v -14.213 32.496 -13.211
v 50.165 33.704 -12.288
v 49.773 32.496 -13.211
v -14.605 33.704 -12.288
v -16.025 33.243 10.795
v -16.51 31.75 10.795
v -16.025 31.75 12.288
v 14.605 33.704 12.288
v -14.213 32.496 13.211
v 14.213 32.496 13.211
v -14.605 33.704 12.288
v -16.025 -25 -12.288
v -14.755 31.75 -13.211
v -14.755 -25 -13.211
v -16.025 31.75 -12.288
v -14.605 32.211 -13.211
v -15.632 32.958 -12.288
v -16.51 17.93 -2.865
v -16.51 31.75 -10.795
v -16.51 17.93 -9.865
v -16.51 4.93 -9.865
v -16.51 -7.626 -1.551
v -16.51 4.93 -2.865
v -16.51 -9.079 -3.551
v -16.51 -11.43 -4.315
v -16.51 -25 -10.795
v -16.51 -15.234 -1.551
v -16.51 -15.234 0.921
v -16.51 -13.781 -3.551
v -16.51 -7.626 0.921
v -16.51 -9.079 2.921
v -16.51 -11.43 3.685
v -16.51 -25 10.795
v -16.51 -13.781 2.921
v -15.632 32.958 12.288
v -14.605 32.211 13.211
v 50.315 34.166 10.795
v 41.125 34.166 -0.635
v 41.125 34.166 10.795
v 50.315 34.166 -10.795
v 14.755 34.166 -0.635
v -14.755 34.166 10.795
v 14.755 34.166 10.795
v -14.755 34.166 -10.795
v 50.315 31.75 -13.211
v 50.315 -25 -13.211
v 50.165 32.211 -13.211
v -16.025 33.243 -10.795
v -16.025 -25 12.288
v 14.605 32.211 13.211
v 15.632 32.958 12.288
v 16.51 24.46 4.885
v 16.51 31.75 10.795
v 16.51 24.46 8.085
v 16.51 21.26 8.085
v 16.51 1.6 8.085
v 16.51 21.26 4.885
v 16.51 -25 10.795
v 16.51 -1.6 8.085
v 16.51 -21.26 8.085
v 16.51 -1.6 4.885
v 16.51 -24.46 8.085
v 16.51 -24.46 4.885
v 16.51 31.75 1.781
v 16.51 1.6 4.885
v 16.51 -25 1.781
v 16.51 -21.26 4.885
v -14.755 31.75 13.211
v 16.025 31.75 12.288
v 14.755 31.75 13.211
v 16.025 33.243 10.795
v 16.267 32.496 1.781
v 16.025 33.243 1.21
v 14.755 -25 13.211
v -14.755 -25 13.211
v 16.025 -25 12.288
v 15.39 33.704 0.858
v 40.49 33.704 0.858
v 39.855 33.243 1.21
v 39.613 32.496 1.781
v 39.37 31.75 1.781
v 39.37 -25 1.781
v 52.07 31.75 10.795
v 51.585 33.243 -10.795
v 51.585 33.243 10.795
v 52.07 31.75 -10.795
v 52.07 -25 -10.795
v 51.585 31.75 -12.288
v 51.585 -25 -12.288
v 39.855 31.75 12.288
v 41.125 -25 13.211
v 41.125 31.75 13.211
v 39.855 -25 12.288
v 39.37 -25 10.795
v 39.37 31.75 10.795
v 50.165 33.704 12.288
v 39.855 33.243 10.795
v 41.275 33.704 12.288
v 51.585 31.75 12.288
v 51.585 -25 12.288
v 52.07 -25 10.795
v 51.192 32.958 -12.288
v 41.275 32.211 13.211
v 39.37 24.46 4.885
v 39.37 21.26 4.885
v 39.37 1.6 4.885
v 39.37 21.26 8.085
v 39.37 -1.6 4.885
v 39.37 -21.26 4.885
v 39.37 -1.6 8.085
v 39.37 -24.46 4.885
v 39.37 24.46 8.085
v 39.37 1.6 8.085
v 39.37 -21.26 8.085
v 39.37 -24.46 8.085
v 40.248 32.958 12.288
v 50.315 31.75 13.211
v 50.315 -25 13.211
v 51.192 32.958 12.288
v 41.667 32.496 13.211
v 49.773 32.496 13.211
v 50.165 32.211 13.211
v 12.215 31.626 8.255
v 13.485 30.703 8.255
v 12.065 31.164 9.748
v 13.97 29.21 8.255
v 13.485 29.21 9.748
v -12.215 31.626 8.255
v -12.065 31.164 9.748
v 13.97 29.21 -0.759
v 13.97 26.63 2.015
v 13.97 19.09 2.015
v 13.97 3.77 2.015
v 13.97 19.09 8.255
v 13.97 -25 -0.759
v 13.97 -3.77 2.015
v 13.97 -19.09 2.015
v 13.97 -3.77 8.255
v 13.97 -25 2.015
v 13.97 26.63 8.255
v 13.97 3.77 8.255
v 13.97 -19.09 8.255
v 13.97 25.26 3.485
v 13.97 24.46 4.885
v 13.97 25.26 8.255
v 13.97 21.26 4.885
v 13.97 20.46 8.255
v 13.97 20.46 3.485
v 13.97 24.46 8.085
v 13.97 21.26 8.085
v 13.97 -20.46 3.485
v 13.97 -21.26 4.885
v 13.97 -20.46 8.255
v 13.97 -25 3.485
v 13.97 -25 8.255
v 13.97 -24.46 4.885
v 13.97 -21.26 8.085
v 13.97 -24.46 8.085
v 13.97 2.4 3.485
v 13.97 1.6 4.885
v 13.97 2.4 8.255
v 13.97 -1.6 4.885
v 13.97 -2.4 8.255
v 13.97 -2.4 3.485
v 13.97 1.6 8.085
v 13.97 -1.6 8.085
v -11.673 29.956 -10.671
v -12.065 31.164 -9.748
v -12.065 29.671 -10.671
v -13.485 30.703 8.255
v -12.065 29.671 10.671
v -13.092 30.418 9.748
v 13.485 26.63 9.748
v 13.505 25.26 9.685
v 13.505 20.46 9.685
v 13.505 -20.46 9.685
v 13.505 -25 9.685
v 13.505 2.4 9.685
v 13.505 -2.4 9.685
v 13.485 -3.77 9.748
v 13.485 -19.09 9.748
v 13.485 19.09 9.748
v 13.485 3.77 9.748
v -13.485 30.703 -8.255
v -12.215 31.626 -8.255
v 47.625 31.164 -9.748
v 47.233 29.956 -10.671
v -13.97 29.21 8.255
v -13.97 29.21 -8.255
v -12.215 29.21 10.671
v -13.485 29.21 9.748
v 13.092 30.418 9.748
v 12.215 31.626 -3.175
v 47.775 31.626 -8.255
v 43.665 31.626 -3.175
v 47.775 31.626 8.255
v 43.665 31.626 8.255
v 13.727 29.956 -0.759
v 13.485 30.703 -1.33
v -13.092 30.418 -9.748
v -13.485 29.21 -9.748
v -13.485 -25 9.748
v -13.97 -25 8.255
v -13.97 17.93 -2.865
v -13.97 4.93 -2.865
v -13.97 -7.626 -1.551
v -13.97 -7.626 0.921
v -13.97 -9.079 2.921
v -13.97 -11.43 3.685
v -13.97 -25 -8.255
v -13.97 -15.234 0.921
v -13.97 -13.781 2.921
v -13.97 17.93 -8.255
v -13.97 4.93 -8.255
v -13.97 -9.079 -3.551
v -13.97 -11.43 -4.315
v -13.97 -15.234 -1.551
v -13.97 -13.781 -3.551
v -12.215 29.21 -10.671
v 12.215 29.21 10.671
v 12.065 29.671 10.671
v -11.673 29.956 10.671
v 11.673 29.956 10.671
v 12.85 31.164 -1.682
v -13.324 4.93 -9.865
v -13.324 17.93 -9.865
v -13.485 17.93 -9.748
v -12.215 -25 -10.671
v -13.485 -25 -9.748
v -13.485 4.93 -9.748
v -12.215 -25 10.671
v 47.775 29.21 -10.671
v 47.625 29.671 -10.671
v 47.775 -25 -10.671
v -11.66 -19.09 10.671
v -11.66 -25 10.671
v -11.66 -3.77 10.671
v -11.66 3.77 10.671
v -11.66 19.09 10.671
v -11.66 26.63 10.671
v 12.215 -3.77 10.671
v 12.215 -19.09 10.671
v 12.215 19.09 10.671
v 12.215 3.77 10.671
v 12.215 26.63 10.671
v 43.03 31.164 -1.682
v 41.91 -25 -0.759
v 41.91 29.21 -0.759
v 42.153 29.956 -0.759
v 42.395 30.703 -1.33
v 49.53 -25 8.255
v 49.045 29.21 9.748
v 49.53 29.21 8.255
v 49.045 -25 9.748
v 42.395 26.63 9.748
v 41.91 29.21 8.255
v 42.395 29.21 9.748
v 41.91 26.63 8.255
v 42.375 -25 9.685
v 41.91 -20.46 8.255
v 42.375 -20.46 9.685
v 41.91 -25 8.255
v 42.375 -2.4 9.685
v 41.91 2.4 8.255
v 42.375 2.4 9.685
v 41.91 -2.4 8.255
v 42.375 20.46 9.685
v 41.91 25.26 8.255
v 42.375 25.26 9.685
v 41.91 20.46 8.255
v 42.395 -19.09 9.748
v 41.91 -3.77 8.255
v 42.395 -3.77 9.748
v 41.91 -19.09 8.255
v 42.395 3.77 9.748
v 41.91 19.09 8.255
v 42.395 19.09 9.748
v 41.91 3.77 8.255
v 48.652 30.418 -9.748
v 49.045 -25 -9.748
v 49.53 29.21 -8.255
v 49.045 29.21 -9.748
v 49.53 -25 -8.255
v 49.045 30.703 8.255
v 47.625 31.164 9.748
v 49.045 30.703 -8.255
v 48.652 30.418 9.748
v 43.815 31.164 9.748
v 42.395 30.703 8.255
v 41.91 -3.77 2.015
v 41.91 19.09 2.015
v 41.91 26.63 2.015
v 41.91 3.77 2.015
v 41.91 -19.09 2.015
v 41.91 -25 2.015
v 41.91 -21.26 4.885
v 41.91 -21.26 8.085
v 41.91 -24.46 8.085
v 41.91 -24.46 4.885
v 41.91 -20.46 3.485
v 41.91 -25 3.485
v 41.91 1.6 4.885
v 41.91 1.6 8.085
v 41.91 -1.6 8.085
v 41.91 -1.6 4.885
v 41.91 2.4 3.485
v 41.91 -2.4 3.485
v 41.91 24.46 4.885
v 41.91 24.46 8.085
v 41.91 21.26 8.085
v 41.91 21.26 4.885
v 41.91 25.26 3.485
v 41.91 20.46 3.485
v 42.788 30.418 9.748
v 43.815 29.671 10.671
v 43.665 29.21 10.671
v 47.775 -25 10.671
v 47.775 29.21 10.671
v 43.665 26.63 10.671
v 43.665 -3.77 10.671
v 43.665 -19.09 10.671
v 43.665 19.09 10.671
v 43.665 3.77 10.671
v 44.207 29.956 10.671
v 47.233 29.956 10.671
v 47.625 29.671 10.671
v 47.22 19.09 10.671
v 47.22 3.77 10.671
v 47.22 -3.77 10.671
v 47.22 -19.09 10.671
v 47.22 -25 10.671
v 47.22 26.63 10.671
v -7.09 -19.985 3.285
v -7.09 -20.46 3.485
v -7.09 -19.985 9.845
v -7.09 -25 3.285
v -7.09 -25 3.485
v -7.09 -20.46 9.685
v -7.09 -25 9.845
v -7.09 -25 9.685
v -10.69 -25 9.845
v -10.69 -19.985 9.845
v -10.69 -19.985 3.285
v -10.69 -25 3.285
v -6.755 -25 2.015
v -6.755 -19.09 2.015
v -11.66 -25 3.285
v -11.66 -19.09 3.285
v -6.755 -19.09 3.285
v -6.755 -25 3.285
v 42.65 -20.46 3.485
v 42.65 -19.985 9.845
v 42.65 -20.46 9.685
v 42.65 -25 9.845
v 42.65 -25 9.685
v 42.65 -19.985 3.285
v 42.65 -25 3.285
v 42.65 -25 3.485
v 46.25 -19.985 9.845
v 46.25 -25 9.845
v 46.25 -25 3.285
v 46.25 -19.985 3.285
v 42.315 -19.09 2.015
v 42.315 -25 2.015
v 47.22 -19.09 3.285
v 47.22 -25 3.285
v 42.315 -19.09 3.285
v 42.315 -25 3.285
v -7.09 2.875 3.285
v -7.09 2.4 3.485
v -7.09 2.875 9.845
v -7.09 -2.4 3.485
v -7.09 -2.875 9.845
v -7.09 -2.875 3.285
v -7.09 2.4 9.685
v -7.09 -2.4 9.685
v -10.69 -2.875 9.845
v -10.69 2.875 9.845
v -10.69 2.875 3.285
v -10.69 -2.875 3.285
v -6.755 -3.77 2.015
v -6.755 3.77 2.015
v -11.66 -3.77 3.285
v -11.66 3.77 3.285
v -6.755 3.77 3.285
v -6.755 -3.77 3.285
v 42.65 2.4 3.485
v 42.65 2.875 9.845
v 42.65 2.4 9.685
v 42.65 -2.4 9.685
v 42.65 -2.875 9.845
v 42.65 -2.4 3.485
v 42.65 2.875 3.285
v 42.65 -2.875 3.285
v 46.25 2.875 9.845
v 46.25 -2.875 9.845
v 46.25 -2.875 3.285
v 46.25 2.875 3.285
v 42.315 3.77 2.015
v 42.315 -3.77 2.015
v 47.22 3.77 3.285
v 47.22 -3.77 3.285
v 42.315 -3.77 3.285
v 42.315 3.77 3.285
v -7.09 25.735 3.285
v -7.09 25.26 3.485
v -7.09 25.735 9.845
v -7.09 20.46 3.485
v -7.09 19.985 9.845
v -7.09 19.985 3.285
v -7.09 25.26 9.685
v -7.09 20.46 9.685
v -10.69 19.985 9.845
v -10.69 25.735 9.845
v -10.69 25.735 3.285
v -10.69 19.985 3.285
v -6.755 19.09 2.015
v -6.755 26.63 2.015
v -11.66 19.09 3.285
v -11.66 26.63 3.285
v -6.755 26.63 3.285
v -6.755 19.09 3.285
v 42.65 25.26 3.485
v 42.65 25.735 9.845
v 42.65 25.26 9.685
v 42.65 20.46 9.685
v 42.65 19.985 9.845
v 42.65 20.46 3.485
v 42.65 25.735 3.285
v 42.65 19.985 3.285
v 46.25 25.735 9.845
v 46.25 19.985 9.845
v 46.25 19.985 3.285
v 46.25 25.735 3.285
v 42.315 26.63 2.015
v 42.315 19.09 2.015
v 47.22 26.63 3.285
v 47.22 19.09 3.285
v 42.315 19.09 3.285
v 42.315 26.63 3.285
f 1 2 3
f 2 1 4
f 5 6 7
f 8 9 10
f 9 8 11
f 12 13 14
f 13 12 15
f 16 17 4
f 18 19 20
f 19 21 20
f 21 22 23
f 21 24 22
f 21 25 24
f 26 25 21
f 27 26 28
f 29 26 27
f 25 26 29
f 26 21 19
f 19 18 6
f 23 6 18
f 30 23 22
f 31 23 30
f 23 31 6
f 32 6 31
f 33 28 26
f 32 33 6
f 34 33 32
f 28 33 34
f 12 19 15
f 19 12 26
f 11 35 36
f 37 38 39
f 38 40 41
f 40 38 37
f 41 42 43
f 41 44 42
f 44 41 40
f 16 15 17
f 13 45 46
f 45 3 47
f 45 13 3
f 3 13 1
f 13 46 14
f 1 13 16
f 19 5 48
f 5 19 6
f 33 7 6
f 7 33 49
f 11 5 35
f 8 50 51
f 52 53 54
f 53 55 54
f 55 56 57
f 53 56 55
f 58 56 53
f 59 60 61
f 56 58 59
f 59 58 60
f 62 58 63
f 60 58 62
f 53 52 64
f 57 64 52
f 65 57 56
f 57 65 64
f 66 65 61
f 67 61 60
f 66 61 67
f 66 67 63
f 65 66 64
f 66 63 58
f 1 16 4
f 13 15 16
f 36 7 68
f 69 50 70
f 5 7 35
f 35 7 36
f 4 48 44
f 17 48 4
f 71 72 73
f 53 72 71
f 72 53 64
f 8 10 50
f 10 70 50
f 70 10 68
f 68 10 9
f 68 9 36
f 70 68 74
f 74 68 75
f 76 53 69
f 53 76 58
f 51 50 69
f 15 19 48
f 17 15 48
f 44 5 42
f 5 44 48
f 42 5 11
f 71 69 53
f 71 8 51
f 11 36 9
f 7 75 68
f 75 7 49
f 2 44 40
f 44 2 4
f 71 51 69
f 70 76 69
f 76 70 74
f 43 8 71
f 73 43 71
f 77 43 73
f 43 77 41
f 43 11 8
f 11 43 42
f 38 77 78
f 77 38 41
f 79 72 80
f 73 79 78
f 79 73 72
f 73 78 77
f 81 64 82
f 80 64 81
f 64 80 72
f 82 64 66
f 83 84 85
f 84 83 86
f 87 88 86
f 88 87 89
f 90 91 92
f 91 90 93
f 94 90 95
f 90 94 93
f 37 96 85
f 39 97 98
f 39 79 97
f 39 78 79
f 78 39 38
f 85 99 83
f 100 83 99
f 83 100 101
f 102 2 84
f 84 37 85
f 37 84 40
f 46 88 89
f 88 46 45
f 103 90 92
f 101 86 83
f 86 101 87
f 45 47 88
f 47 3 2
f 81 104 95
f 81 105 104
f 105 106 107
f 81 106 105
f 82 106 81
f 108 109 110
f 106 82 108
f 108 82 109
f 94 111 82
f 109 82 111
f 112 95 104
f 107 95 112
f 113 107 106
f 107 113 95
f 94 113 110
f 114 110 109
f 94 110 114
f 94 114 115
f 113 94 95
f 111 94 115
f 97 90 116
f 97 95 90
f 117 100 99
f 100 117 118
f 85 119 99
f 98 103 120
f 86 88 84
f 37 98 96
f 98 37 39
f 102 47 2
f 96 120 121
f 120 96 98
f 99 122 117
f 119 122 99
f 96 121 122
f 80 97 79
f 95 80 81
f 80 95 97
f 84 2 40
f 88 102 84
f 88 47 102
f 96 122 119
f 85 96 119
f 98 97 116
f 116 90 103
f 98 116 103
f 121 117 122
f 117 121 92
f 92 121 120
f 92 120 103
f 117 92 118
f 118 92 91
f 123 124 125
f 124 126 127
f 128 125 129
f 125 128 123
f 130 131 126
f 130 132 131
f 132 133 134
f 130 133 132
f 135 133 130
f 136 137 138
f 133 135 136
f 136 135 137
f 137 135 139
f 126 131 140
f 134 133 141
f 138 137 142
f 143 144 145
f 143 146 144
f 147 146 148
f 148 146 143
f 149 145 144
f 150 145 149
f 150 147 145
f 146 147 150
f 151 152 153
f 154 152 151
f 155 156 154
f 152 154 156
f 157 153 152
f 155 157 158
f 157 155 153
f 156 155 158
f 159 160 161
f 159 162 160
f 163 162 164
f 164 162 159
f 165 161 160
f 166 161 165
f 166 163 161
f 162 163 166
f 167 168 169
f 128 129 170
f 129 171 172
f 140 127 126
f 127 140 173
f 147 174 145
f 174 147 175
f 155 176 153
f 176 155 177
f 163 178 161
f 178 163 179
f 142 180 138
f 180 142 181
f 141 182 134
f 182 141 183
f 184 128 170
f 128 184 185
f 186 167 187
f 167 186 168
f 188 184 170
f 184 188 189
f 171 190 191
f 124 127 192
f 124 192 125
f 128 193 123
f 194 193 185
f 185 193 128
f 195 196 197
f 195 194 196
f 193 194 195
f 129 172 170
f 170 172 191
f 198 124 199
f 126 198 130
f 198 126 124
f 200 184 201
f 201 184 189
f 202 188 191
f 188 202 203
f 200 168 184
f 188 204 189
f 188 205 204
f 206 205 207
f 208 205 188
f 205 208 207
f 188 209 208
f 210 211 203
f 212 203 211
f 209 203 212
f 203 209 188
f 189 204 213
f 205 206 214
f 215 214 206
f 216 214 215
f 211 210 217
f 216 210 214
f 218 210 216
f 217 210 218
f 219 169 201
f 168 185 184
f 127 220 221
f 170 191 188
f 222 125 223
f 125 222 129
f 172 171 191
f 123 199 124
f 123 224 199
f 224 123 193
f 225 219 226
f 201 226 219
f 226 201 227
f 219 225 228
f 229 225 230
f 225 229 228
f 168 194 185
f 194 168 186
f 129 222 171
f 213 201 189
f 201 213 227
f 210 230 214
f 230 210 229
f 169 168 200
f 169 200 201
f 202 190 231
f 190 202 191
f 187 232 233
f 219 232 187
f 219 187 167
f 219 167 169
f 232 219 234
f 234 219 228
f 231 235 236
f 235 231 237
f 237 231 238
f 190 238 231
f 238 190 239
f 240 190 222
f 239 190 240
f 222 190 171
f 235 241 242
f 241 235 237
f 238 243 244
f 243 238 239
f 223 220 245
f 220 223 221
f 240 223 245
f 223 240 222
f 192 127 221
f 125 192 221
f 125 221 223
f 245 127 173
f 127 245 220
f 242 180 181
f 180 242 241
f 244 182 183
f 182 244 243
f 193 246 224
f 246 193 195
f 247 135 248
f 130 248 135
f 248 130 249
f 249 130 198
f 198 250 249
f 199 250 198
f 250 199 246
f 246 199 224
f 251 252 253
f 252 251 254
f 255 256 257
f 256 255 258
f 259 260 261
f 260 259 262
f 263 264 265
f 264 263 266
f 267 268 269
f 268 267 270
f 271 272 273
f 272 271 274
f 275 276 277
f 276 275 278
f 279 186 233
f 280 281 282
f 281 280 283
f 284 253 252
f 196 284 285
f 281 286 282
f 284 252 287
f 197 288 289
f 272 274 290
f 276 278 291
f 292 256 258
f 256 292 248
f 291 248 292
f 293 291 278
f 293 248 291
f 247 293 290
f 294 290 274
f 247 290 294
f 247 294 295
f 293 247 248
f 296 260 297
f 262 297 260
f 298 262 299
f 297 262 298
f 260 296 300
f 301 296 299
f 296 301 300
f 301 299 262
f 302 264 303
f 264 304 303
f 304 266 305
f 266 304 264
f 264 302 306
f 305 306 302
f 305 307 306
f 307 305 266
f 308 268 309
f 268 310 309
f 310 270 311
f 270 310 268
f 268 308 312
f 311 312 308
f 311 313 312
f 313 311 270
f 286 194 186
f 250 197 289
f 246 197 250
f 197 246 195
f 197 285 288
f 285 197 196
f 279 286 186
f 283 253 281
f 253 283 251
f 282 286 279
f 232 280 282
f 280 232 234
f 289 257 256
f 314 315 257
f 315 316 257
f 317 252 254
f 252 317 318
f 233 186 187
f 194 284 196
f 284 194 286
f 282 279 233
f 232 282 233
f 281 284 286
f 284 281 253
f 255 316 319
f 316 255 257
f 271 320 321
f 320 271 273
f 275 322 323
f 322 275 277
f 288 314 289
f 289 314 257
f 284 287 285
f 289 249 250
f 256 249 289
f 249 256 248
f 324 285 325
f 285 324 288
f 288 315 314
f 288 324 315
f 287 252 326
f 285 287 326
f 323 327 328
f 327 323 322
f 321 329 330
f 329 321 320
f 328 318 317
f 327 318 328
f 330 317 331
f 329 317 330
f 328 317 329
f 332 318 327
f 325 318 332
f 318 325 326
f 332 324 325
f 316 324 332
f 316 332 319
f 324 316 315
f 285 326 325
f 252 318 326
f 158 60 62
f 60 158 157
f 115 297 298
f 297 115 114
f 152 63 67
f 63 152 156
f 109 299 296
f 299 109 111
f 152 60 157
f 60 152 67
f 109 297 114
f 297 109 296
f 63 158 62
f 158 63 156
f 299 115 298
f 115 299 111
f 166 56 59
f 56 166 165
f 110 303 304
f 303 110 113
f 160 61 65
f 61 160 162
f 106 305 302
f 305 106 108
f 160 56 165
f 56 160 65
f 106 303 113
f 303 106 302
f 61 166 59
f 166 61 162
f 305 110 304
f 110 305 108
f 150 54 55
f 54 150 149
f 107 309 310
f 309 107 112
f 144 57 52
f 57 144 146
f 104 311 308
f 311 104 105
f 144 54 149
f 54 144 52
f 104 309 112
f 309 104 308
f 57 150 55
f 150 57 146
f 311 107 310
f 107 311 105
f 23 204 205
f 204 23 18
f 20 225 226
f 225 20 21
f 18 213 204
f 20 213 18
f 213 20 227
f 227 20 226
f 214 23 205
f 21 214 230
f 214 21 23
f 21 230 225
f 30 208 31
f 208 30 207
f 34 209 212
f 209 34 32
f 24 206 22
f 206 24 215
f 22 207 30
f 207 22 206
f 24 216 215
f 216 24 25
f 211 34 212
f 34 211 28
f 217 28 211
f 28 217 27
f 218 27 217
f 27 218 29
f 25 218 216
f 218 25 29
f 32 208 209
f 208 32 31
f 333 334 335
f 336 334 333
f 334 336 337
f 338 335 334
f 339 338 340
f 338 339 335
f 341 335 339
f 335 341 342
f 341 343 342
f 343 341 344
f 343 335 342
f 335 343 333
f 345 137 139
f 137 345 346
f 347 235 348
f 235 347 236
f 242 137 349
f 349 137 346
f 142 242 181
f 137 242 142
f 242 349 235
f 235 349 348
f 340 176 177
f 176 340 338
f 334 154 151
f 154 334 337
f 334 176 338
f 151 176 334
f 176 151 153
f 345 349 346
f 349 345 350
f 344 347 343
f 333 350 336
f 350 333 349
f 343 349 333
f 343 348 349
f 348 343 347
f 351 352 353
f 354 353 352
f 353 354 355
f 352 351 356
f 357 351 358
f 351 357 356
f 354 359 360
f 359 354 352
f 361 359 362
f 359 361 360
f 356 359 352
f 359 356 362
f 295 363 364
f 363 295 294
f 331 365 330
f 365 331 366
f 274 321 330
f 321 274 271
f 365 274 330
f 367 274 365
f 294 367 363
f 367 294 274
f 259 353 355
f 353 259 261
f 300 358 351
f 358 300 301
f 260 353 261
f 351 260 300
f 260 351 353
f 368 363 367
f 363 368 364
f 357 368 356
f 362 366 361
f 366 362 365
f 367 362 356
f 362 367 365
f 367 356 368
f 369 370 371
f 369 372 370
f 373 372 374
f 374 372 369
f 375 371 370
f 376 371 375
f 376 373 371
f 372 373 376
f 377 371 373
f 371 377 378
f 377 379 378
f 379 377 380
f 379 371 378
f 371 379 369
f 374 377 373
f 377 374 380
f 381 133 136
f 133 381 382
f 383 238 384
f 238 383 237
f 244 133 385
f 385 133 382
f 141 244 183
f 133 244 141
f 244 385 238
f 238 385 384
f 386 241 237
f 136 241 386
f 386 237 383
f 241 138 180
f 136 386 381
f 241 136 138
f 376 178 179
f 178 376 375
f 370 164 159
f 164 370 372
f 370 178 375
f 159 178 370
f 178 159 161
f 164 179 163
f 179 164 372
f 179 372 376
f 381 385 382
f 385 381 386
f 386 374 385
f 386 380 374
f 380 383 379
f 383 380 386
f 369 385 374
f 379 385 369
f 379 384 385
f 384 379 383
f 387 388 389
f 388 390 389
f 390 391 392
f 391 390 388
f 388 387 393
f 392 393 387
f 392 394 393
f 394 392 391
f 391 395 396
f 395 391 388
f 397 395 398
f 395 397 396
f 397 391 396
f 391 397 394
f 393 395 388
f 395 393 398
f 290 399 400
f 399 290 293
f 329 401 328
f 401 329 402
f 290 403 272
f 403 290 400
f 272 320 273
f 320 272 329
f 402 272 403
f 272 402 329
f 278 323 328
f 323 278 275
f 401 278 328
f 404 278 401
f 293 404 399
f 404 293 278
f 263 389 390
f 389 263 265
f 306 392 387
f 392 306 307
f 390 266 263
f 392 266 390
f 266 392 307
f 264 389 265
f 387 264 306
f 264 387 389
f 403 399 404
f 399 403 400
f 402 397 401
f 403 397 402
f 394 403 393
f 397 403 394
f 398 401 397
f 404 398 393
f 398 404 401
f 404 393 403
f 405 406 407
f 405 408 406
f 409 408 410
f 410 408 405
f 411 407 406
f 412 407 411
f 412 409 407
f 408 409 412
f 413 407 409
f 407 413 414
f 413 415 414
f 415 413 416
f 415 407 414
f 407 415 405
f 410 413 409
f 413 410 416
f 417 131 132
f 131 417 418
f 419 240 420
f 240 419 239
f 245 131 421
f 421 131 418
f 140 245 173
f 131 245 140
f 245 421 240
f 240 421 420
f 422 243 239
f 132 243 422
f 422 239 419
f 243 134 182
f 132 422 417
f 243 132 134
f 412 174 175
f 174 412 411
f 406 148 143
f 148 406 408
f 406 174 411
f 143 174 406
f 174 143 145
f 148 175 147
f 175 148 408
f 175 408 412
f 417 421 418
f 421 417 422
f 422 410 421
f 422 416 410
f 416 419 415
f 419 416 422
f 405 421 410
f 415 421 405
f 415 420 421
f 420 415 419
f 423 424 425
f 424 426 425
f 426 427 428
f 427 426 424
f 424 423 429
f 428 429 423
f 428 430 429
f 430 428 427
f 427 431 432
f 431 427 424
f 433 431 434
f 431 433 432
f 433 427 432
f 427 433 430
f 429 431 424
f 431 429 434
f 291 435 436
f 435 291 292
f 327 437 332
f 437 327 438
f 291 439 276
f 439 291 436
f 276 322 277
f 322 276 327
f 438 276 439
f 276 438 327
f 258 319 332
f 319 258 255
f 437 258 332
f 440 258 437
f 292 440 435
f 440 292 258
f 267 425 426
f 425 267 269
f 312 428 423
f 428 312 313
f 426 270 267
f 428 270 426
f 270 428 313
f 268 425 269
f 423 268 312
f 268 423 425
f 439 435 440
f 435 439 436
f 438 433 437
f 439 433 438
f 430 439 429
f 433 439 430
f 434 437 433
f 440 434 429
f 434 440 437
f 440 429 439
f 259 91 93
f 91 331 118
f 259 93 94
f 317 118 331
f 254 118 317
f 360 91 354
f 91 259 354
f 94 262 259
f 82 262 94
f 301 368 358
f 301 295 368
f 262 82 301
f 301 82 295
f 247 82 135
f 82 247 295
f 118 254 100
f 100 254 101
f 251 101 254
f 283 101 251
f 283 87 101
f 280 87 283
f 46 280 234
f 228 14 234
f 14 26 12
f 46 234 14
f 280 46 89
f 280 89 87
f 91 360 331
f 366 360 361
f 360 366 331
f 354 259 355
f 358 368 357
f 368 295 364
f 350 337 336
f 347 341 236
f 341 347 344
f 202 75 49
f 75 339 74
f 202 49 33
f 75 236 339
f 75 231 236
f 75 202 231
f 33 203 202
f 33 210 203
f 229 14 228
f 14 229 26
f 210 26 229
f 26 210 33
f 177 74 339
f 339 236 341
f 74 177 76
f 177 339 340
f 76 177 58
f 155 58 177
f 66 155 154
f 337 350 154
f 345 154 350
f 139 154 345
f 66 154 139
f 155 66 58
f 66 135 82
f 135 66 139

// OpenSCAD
$fn = 10 ;
pouce=2.54;

largeur=26*pouce;
longueur_electronique = 12*pouce;
longueur_doigt = 12*pouce;
longueur_led = 4*pouce;
e=pouce ;
hauteur_doigt=4.5*pouce;
hauteur_electronique = 5*pouce ;
hauteur=hauteur_doigt + hauteur_electronique  ;

hled= 6.4; // hauteur led
lled = 5 ; // largeur led
eled = 3 ; // epaisseur led
dhled = 3.2 ; // distance top=>center of led
dled = 3.2 ; // dimension active led
pled = 20-6.4 -5; // dimension pattes led
iled = 9*pouce ; // intervale entre leds
dzporteled = hauteur/2 - e -e - 0.5 ; 


epcb = 1.5 ;
dyteensy = 4.5*pouce ;
dzusbteensy = 1.8 ;
dzteensy = - 0.5 ;

dyjack = -4.5*pouce ;
hjack = 3 ;
dzjack = hjack + epcb / 2;

dzpcb = 8 ;

composant = 0 ; // pour voir les composants
audio=1 ; // pour inclure le s2 et le jack

xpcb = longueur_doigt+longueur_electronique+longueur_led - 5*pouce ;
ypcb = largeur - 6*pouce ; 

module led()
{
    union()
    {
        difference()
        {
            cube([eled,lled,hled],center=true);
            translate([eled/2,0,0])
                cube([1,dled,dled],center=true);
        }
        translate([0,pouce /2,-hled/2-pled/2])
            cube([0.4,0.45,pled],center = true );
        translate([0,- pouce /2,,-hled/2-pled/2])
            cube([0.4,0.45,pled],center = true) ;
    }
}
module jack()
{
    union()
    {
        translate([0,-8,3])
        difference()
        {
            cube([6,16,2*hjack],true);
            translate([0,2,0]) rotate([90,0,0]) cylinder(h=15,d=4,center=true);
        }
        translate([-1.5*pouce,-5.5*pouce ,0.3]) cube([2,1,0.6],true) ;
        translate([-1.5*pouce,-1.5*pouce ,0.3]) cube([2,1,0.6],true) ;
        translate([1.5*pouce,-2.0*pouce ,0.3]) cube([2,1,0.6],true) ;
    }
}
module x2()
{
    union()
    {
        // connecteur
        translate([-27,0,4])
            cube([5,33,8],true);
        // circuit
        translate([0,0,8+1])
            cube([67,40,2],true);
        // jack
        translate([-20,20-7,8+1+2.5])
            jack();
        // usb
        translate([20,20-5,8+1+2])
            cube([8,10,4],true);
        // cpu
        translate([0,-10,8+1+1.5])
            cube([13,13,3],true);        
   }
}
module s2pin()
{
    union()
    {
        for(i=[-7,-6,-4,3,4])
        {
            translate([-3*pouce,(i+0.5)* pouce ,2.7]) cube([0.7,0.7,4.5],true) ;
        }
        for(i=[-2,2])
        {
            translate([-4*pouce,(i+0.5)* pouce ,2.7]) cube([0.7,0.7,4.5],true) ;
        }
        // circuit
        difference()
        {
            translate([0,-0.5,4])
                cube([25,34,1.2],true);
            translate([4*pouce,5*pouce,4])
                cube([3,3,2],true);
        }
    }
}
module s2connecteur()
{
    union()
    {
        // connecteur
        translate([-9.5,0,4.5])
            cube([5,13*pouce,9],true);
        // circuit
        difference()
        {
            translate([0,0,4])
                cube([25,34,1.2],true);
            translate([4*pouce,5*pouce,4])
                cube([3,3,2],true);
        }
   }
}
module teensy2()
{
     union()
    {
        for(i=[-4,-3,-2,-1,0,1,2,3,5])
        {
            translate([-3*pouce,(i+0.5)* pouce ,2.5]) cube([0.7,0.7,5],center=true) ;
            translate([3*pouce,(i+0.5)* pouce ,2.5]) cube([0.7,0.7,5],center=true) ;
        }
        // circuit
        translate([0,0,4])
            cube([7.5*pouce,12*pouce,1.2],center=true);
        // usb
        translate([0,10.5,dzusbteensy])
            difference()
            {
                cube([7,9,4],true);
                cube([5,10,2],true);
            }
        // bouton
        translate([0,-4.5*pouce,2])
            cube([3,3,3],true);
   }
}
module pcb()
{
    difference()
    {
        cube([xpcb ,ypcb  ,epcb],true);
        // trou usb teensy
        translate([-9.5*pouce,dyteensy,]) rotate([0,0,90])cube([11,13,5],center=true);
        // trou bouton teensy
        translate([-1*pouce,dyteensy,]) rotate([0,0,90])cube([5,5,5],center=true);
        // grile pouces
        for(i = [-12,-11,-10,-7,0,2,9,10,11])
        {
            for ( j = [-9,-8,-7,-6,-2,0,1,6,7,8,9,10] )
            {
                translate([i*pouce,(j-0.5)*pouce,]) cube([0.5,0.5,5],center=true);
            }
        }
    }
    translate([-5.5*pouce,dyteensy,dzteensy]) rotate([0,180,90]) teensy2() ;
    if ( audio == 1)
    { 
        translate([2*pouce,-4.5*pouce,pouce/2]) rotate([0,180,-90]) s2pin() ;
        translate([-11.5*pouce,dyjack,epcb/2]) rotate([0,0,90]) jack();
    }
}
module contour(x,y,z)
{
    minkowski() {
        cube([x-e,y-e,z-e],true);
        // coins es
        sphere(e);
    }
}
module dedans(x,y,z)
{
    minkowski() {
        cube([x-e-2*e,y-e-2*e,z-e-2*e],true);
        // coins es
        sphere(e);
    }
}
module demichanfrein(longueur,largeur,epaisseur)
{
    del=2;
    rotate([-90,0,0])
    translate([0,del/2,0])
    difference()
    {
        hull()
        {
            cylinder(h=longueur,d=epaisseur+del,center=true);
            translate([largeur,0,0])
                cylinder(h=longueur,d=del,center=true);
        }
        translate([0,25-del/2,0])
            cube([50,50,50],center=true) ;
    }
}
module chanfrein(longueur,largeur,epaisseur)
{
    rotate([0,0,90])
    union()
    {
        translate([-largeur/2,0,0])
            demichanfrein(longueur,largeur/3,epaisseur);
        translate([largeur/2,0,0])
            rotate([0,0,180])
                demichanfrein(longueur,largeur/3,epaisseur);
    }
}
module porteled(l)
{
    union()
    {
        difference()
        {
            // tunnel
            translate([(l+eled)/2,0,0])
                cube([eled + e + l + eled ,lled + e ,hled + e ],center=true);
            // moins logement led
            scale([1.2,1.15,1.05]) led() ;
            // moins degagement led
            translate([(l+eled)/2,0,0.1])
                cube([eled  + l + eled ,lled -0.2 ,hled - 0.2 ],center=true);
            // ouverture tunnel extrémité
            translate([10 + (l+eled/2),0,0])
                cube([20 ,20,20],center=true);
            // moins degageent pour inserer la led
            translate([-e/2,0,-10-hled/2])
                cube([eled + 1.5* e ,20,20],center=true);
        }
        if (composant == 1)
            led();
    }
}
module boite ()
{
    union()
    {
        difference()
        {
            // boitier plein
            union()
            {
                contour(longueur_electronique,largeur,hauteur);
                translate([longueur_doigt/2 + longueur_electronique/2 -e  , 0,-hauteur_doigt/2])
                    contour(longueur_doigt,largeur,hauteur_electronique);
                translate([longueur_led/2 + longueur_doigt + longueur_electronique/2 - 2* e ,0,0])
                    contour(longueur_led,largeur,hauteur);
            }
            // evidement boitier
            union()
            {
                dedans(longueur_electronique,largeur,hauteur);
                translate([longueur_doigt/2 + longueur_electronique/2 -e , 0,-hauteur_doigt/2])
                    dedans(longueur_doigt+4*e,largeur,hauteur_electronique);
                translate([longueur_led/2 + longueur_doigt + longueur_electronique/2 - 2 * e ,0,0])
                    dedans(longueur_led,largeur,hauteur);
            }
            // trous pour les chemins optiques
            union()
            {
                
                for(nrled = [-1:1] )
                {
                    translate([longueur_doigt/2 + longueur_electronique/2 -pouce ,nrled * iled,dzporteled ])
                       cube([longueur_doigt+4*pouce,dled,dled],center=true);
                }
            }
            // couvercle_fond
            *translate([longueur_electronique/2+e,0,-hauteur/2])
                cube([longueur_doigt+longueur_electronique+longueur_led - 4*e,largeur - 2*e,e*2],true);
            // trou fiche usb
            translate([-longueur_electronique+6*pouce,dyteensy,-dzusbteensy + dzteensy -hauteur/2 + dzpcb ])
                cube([2*pouce,13,7],center=true);
            if ( audio == 1)
            {
                // trou fiche jack
                translate([-longueur_electronique+5*pouce,dyjack,dzjack -hauteur/2 + dzpcb]) 
                    rotate([0,90,0]) 
                        cylinder(h=2*pouce,d=8);
            }
        }    
    }
    // chemins optiques
    union()
    {
        for(nrled = [-1:1] )
        {
            // recepteur
            translate([-(longueur_electronique -3*e )/2 +  e,nrled * iled,dzporteled  ])
                   porteled(longueur_electronique - 3*e );
            // emetteur
            translate([longueur_doigt + longueur_electronique/2 -pouce/2 ,nrled * iled,dzporteled ])
                    rotate([0,0,180])
                        porteled(pouce);
            // guide doigt
            *translate([longueur_doigt / 2 + longueur_electronique/2 - 2* e + e  ,nrled * iled,hauteur/2 - hauteur_doigt+e/4])
                chanfrein(longueur_doigt-2*e,iled *0.6,4);
        }
    }
    // composants
    if (composant == 1)
    {
        // pcb
        translate([longueur_electronique/2 + 0.5*pouce,0,-hauteur/2 + dzpcb ] ) 
            pcb() ;
     }

}
*pcb();
*s2pin();
*jack();
*teensy2();
*porteled(5);
*chanfrein(10,10,3);
difference()
{
    boite() ;
    translate([0,-125,0])
        cube([200,200,200], center = true);
}
echo("largeur=",largeur," longueur=",longueur_electronique+longueur_doigt+longueur_led, " hauteur=",hauteur);
echo ("xpcb=",xpcb, " ypcb=",ypcb);
